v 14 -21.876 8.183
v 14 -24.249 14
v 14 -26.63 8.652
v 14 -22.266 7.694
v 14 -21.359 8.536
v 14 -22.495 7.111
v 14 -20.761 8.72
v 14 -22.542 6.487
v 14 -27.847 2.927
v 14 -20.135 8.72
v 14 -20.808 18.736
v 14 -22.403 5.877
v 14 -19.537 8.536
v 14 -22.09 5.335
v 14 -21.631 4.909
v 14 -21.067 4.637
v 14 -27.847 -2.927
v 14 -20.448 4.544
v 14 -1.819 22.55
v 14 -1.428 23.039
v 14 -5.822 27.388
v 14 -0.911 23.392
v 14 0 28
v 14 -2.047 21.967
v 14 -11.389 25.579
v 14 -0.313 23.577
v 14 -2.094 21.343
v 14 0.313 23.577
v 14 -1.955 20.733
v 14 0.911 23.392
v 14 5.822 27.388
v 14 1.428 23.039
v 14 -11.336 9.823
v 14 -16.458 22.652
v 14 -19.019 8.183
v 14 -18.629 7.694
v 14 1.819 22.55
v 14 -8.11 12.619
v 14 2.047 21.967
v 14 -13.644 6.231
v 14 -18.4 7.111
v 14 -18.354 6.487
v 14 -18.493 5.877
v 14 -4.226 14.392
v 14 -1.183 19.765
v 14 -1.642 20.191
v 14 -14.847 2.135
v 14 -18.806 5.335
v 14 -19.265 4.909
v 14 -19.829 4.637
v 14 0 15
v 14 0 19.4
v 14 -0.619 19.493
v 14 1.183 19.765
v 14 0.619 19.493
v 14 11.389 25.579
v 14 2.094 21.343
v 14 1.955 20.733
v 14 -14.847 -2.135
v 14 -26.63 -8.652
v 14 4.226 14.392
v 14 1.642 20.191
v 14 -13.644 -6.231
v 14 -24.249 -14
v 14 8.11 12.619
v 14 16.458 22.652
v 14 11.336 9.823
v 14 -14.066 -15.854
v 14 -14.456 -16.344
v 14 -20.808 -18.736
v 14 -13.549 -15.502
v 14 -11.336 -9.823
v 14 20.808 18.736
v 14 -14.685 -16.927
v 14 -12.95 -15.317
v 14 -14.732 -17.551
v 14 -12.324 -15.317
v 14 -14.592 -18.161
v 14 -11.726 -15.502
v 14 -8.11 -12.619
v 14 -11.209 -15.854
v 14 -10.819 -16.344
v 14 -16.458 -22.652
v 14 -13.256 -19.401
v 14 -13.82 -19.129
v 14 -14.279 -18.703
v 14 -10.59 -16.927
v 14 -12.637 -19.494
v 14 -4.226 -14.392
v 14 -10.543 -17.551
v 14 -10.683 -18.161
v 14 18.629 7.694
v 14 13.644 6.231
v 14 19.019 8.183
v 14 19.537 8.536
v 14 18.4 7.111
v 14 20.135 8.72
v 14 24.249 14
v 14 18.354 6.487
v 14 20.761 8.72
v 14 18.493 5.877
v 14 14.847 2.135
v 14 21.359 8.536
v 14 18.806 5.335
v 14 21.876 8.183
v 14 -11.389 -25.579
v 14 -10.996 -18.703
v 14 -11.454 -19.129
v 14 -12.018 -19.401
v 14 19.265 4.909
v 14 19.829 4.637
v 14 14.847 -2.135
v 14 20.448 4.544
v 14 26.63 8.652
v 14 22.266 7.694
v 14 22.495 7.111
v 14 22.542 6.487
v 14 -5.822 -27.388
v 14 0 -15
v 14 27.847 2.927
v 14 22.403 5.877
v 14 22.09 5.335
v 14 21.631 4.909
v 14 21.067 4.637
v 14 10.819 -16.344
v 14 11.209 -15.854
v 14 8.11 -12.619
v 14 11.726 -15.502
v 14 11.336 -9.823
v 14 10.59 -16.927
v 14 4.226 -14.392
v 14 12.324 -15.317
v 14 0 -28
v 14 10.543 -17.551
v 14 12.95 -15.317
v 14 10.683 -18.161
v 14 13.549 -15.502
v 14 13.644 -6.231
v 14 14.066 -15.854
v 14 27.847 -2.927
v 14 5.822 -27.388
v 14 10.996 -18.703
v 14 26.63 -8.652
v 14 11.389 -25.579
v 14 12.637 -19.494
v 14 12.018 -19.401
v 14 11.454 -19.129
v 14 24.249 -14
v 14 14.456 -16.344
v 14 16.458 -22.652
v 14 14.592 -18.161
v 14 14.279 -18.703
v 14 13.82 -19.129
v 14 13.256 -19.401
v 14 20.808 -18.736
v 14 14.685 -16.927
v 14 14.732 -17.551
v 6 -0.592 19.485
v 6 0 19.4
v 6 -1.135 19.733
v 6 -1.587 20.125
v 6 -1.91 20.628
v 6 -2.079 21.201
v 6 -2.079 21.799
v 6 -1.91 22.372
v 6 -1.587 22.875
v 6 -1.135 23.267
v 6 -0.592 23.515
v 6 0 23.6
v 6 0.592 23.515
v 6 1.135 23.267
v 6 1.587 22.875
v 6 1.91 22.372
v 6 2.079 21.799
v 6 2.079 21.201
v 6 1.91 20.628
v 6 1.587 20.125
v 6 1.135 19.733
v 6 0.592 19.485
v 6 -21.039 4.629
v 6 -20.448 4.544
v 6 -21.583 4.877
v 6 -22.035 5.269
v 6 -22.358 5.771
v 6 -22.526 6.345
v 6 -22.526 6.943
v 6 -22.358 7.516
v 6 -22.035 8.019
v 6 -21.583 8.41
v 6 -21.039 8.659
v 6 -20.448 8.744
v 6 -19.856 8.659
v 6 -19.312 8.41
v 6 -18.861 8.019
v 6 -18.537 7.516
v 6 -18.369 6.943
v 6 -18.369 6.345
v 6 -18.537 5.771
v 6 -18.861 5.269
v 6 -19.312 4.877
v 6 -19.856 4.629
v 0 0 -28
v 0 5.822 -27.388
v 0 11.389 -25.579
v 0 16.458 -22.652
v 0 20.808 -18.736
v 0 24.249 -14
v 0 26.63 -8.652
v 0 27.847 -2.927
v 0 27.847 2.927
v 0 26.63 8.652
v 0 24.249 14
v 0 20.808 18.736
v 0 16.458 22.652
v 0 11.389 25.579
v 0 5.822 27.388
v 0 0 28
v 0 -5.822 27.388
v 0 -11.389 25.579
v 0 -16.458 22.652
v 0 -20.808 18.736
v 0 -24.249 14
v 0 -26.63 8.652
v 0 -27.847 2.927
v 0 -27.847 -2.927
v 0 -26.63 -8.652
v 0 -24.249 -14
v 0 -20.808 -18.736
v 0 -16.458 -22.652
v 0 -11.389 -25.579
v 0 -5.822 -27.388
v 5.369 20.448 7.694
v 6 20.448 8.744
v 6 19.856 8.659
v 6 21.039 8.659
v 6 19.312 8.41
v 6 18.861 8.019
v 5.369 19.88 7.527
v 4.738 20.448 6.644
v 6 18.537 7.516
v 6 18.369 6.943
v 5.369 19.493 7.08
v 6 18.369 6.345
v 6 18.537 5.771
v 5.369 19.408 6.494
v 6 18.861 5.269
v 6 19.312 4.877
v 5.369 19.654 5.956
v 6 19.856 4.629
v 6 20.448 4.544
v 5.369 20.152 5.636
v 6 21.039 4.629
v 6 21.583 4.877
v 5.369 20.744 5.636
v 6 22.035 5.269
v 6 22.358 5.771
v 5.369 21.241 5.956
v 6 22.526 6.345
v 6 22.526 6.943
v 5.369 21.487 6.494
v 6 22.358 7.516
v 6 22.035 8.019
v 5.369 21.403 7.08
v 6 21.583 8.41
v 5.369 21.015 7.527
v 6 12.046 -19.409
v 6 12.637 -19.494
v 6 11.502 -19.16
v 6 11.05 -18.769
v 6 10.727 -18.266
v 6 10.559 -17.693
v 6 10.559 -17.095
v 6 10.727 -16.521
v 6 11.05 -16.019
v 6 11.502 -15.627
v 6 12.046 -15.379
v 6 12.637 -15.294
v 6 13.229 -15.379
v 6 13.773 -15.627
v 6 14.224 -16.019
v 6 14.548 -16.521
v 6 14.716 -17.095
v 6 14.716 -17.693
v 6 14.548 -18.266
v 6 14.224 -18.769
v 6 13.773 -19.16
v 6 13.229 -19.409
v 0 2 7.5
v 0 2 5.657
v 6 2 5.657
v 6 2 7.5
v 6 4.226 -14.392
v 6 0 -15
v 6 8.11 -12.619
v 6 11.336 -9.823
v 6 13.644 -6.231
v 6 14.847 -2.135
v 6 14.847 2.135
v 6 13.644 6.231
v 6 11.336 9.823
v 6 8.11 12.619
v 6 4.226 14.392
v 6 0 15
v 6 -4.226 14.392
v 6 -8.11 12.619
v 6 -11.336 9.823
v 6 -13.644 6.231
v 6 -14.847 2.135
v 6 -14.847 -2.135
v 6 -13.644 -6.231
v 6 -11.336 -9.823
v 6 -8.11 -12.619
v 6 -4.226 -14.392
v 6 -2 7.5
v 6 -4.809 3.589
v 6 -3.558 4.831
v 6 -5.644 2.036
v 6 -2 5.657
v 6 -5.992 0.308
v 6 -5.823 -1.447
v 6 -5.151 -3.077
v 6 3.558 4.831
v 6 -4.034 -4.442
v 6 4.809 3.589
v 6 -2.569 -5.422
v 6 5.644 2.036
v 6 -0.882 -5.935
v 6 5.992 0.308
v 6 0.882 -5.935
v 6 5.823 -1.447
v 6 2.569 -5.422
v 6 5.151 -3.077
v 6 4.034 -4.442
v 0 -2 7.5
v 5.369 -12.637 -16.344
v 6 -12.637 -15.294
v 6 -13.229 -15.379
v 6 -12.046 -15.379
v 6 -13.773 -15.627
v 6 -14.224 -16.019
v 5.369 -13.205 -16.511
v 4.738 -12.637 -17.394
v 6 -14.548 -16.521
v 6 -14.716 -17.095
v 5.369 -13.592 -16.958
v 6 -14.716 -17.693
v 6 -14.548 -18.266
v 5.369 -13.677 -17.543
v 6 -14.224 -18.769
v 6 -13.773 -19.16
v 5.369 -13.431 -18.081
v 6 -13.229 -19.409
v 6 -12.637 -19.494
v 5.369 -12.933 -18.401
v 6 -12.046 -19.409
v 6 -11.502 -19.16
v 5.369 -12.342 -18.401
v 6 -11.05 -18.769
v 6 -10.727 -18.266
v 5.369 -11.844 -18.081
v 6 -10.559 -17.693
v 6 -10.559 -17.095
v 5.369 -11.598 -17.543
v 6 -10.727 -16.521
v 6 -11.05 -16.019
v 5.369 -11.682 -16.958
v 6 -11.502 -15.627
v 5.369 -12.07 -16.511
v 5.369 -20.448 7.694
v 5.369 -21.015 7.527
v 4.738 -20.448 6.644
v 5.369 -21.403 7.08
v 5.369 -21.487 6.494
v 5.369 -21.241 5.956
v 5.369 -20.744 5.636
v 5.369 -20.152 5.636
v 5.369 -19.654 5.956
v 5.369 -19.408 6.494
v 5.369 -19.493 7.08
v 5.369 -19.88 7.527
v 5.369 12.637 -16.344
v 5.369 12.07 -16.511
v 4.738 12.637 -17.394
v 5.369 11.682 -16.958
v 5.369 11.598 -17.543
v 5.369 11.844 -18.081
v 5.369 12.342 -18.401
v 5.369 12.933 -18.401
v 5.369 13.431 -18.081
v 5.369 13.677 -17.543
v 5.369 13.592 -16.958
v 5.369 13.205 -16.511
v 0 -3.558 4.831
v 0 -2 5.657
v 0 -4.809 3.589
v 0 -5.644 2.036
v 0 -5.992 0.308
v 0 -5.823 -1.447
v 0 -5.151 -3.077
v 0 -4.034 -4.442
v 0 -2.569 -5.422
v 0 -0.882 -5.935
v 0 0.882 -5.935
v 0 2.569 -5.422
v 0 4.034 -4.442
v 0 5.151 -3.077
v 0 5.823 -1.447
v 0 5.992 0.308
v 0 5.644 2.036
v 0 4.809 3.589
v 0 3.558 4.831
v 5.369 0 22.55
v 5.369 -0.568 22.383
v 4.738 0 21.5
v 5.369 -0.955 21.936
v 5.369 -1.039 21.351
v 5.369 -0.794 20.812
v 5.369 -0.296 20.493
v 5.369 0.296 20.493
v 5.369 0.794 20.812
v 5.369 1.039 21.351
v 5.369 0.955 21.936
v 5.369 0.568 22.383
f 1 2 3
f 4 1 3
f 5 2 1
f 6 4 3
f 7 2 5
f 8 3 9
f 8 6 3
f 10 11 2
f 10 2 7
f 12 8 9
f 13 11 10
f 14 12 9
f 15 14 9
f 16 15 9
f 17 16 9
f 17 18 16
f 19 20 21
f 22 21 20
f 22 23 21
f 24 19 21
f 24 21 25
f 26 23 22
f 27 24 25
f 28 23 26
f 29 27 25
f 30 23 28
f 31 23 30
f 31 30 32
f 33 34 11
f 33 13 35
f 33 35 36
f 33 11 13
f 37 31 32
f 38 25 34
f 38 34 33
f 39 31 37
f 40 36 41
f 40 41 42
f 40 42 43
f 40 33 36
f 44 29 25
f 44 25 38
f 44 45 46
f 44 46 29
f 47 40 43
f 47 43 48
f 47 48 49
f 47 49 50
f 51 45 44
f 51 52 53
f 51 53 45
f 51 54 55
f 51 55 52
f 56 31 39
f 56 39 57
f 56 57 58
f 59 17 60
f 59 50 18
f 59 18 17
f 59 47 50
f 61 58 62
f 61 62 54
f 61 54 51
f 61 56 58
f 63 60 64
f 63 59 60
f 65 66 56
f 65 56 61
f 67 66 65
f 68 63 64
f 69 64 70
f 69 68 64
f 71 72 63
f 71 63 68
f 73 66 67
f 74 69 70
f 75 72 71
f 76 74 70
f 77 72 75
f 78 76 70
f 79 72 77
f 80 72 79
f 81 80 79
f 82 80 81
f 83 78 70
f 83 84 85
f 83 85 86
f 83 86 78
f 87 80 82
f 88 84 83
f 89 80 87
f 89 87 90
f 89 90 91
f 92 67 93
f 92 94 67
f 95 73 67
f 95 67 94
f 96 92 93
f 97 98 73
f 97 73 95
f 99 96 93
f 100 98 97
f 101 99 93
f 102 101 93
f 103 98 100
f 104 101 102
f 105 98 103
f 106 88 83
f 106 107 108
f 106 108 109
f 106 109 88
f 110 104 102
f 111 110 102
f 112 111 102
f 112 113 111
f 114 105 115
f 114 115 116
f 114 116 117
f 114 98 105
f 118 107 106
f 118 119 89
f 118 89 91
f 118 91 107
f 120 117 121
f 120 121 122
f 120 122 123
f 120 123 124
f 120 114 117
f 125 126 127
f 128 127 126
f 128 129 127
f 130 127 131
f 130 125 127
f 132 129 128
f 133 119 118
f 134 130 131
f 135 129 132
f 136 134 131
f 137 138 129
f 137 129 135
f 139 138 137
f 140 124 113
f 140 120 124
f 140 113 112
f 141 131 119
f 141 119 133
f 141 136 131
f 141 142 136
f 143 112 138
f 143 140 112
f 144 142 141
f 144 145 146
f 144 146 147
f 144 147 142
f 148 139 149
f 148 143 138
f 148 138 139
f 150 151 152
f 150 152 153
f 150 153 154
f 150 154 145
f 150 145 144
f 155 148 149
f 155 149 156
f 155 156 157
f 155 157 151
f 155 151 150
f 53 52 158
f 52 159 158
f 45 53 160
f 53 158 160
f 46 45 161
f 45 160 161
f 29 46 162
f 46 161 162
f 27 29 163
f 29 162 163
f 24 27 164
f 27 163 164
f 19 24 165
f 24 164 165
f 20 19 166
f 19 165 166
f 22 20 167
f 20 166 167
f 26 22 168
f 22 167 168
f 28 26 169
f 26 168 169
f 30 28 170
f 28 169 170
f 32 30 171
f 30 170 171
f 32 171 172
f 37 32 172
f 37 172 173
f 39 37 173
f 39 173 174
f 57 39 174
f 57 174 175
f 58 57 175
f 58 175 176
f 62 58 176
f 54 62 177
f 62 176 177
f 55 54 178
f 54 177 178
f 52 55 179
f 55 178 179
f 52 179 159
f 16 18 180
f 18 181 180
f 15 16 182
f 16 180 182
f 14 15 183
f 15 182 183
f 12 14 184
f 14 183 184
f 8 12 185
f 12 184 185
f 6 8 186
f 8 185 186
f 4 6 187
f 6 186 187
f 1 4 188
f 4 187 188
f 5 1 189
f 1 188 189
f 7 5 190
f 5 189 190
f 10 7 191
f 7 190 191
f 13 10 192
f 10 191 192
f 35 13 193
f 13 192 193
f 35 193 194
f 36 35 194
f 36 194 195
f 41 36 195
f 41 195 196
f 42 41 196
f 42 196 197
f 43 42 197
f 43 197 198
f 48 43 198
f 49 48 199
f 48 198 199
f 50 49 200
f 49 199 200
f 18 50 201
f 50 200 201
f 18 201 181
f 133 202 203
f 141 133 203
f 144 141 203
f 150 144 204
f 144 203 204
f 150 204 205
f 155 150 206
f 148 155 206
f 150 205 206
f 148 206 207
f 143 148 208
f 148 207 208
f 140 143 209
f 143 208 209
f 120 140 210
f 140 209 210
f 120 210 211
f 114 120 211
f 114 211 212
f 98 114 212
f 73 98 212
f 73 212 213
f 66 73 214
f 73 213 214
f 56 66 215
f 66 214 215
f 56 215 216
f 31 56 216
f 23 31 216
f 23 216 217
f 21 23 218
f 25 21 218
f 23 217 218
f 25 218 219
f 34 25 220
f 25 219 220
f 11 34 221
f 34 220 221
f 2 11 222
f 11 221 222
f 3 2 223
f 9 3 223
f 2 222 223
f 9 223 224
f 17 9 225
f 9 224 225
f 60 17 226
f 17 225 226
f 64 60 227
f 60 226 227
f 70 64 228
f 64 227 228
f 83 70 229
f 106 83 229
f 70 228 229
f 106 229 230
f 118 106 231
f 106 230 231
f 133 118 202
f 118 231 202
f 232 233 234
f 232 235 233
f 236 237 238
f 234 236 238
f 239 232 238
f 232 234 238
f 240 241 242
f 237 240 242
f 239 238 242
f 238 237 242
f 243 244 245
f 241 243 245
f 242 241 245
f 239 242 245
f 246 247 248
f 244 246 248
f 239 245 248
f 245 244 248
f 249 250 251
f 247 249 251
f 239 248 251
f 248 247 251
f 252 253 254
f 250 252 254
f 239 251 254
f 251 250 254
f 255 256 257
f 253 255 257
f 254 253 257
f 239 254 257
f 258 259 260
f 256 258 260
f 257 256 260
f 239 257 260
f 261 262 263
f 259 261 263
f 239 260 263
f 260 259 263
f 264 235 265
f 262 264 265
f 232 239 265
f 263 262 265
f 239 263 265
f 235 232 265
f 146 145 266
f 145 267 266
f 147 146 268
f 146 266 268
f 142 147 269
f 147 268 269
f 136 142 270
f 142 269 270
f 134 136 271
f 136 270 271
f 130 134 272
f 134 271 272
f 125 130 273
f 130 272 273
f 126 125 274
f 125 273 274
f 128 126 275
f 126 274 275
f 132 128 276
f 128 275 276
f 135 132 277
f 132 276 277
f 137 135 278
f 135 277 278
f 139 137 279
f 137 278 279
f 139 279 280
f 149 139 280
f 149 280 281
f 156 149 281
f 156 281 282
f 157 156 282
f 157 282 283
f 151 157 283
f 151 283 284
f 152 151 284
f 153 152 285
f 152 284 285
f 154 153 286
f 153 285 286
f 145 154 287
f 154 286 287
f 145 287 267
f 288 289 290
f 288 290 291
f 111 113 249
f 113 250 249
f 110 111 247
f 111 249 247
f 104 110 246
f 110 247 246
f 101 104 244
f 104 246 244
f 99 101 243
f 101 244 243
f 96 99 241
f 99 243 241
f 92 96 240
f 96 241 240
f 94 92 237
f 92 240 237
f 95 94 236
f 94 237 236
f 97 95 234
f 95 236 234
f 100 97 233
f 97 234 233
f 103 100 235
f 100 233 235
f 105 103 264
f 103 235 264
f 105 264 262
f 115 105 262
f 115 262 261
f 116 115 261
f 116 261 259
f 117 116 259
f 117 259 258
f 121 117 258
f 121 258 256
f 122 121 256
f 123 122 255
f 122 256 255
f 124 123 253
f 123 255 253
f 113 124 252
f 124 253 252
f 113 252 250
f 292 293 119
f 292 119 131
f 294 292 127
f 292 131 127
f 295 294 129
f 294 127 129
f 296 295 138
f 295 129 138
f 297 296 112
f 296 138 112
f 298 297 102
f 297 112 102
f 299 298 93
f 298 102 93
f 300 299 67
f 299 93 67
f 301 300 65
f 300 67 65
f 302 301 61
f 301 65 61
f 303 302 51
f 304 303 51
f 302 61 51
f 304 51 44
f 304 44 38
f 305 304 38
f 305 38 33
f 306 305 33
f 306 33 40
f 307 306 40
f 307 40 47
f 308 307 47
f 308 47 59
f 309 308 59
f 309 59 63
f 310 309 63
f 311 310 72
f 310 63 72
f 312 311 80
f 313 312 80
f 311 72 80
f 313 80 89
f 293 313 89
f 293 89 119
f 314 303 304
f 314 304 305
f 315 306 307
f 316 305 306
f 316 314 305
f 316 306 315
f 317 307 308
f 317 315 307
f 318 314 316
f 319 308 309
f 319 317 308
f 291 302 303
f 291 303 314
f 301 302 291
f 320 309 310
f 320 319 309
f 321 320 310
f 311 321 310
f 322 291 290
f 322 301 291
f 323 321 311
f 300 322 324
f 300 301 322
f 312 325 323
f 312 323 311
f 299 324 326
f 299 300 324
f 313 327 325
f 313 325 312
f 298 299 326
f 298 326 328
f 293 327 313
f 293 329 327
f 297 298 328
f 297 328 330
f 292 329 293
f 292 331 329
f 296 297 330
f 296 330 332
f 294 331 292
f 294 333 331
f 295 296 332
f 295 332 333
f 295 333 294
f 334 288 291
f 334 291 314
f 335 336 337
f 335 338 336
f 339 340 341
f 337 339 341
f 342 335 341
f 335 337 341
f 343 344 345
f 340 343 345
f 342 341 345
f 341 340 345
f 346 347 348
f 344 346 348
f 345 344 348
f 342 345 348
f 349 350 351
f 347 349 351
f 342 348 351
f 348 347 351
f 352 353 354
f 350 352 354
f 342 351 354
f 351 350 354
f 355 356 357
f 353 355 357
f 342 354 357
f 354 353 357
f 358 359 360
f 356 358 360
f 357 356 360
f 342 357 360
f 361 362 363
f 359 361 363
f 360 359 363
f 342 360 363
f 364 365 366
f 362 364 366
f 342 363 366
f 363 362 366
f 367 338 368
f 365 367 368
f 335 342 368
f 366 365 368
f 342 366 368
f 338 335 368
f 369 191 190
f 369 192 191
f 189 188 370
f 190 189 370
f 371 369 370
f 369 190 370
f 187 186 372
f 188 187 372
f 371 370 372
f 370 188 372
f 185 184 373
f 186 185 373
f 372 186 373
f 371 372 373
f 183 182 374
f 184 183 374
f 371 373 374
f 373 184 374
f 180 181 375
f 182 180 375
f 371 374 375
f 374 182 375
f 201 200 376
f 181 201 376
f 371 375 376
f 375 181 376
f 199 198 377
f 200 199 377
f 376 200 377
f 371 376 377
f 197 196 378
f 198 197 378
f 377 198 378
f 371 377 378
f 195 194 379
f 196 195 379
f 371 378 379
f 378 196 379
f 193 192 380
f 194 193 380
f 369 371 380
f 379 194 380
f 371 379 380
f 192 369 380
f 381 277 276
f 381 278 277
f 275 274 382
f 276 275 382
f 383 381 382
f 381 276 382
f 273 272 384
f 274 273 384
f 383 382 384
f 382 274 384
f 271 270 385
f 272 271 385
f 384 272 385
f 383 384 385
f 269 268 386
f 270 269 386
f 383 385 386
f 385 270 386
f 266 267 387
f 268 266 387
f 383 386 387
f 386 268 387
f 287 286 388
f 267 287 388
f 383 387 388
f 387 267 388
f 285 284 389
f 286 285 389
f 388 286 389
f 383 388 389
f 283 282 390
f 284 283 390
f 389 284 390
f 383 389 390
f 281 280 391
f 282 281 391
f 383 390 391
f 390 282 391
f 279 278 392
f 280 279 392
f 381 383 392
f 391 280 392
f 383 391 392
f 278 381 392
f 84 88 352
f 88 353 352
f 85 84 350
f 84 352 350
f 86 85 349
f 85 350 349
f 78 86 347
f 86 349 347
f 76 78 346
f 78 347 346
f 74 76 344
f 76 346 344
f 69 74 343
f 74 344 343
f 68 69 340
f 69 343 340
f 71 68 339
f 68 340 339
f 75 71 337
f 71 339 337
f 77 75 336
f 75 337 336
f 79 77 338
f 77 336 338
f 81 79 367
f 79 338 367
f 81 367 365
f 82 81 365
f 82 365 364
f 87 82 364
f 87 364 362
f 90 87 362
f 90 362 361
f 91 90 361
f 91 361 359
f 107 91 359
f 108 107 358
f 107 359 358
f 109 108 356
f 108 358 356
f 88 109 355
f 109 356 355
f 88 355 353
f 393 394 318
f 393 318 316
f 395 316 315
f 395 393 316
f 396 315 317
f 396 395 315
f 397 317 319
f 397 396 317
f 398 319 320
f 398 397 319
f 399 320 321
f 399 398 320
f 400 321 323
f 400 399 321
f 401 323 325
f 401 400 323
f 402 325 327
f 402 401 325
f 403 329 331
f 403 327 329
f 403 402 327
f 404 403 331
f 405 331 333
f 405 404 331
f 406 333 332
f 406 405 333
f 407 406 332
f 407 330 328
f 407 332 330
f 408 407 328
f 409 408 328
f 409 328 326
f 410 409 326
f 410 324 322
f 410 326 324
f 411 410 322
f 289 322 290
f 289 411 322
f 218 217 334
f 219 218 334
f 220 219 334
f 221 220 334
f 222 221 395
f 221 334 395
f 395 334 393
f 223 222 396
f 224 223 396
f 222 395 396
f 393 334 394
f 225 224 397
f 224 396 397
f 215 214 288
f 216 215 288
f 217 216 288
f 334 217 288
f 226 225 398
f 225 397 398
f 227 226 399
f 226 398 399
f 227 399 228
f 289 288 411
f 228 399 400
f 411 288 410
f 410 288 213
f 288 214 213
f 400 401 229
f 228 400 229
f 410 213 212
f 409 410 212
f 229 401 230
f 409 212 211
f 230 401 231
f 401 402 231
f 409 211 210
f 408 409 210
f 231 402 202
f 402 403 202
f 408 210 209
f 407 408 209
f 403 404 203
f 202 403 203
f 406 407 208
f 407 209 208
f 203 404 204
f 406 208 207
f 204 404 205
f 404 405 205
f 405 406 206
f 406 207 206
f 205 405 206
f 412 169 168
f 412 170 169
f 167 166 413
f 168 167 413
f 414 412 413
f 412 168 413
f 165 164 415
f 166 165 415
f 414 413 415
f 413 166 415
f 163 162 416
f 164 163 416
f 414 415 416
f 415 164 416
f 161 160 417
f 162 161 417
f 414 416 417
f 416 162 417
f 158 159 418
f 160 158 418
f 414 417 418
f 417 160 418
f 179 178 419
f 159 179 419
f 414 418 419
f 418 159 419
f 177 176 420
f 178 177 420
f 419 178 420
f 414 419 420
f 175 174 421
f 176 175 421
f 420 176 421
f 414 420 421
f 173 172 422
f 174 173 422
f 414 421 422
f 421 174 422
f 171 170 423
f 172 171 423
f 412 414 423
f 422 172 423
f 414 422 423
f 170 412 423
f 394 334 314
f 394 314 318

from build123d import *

# Parameters (mm, degrees)
SKETCH1_R                 = 28
BOSS_EXTRUDE1_DEPTH       = 14
SKETCH2_R                 = 15
CUT_EXTRUDE1_DEPTH        = 8
CUT_EXTRUDE2_DEPTH        = 16
M5X0_8_TAPPED_HOLE1_D     = 4.2
M5X0_8_TAPPED_HOLE1_DEPTH = 8
M5X0_8_TAPPED_HOLE1_TIP   = 1.2618073


with BuildPart() as part:
    # Sketch1 → Boss-Extrude1 (new body)
    with BuildSketch(Plane.YZ):
        with Locations(Location((0, 0, 0), (0, 0, 270))):
            Circle(SKETCH1_R)
    extrude(amount=BOSS_EXTRUDE1_DEPTH)

    # Sketch2 → Cut-Extrude1 (cut)
    with BuildSketch(Plane.YZ.offset(14)):
        with Locations(Location((0, 0, 0), (0, 0, 270))):
            Circle(SKETCH2_R)
    extrude(amount=-CUT_EXTRUDE1_DEPTH, mode=Mode.SUBTRACT)

    # Sketch3 → Cut-Extrude2 (cut)
    with BuildSketch(Plane(origin=(0, 0, 0), x_dir=(0, -1, 0), z_dir=(-1, 0, 0))):
        with BuildLine():
            Line((-2, 7.5), (2, 7.5))
            Line((2, 7.5), (2, 5.656854249))
            ThreePointArc((2, 5.656854249), (0, -6), (-2, 5.656854249))
            Line((-2, 5.656854249), (-2, 7.5))
        make_face()
    extrude(amount=-CUT_EXTRUDE2_DEPTH, mode=Mode.SUBTRACT)

    # M5x0.8 Tapped Hole1
    with Locations(Plane(origin=(14, -20.4477151, 6.643865379), x_dir=(0, 0, 1), z_dir=(1, 0, 0))):
        with Locations((0, 0), (14.856134621, -20.4477151), (-24.037730758, -7.810332176), (-24.037730758, -33.085098024), (0, -40.8954302)):
            Hole(M5X0_8_TAPPED_HOLE1_D / 2, depth=M5X0_8_TAPPED_HOLE1_DEPTH)
            with Locations((0, 0, -(M5X0_8_TAPPED_HOLE1_DEPTH + M5X0_8_TAPPED_HOLE1_TIP / 2))):  # 118° drill point
                Cone(0, M5X0_8_TAPPED_HOLE1_D / 2, M5X0_8_TAPPED_HOLE1_TIP, mode=Mode.SUBTRACT)


solid = part.part
